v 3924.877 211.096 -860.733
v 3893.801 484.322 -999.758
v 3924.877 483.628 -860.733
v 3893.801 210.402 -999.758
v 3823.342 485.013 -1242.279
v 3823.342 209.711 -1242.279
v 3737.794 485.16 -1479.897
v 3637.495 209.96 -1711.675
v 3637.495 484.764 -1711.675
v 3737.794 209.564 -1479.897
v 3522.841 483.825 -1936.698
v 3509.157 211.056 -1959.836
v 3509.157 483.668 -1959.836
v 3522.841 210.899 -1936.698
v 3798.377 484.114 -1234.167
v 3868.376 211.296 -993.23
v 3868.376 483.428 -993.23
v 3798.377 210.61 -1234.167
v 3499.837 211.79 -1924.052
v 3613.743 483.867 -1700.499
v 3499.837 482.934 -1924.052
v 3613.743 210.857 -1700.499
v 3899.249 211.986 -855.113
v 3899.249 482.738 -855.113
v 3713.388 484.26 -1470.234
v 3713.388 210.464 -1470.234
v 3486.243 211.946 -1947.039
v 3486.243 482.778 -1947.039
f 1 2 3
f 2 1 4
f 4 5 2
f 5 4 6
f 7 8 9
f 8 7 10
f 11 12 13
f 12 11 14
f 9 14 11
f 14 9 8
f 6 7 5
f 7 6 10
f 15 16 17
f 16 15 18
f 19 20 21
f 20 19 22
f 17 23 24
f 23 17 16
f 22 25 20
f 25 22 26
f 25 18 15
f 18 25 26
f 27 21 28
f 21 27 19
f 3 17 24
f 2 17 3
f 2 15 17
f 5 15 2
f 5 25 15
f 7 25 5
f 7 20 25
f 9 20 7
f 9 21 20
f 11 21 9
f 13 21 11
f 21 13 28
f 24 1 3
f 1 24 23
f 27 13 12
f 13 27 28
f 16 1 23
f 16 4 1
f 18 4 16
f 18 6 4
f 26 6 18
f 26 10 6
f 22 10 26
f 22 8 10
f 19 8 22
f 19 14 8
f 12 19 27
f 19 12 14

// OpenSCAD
rotate(-90.0, [1.0, 0.0, 0.0]) {
    translate([0.0, 0.0, 347.362]) {
    intersection() {
    difference() {
    cylinder(h = 315.0, r = 4020.1, $fn=100, center=true);
    cylinder(h = 615.0, r = 3993.85, $fn=100, center=true);
}
    rotate(20.776137298, [0.0, 0.0, 1.0]) {
    rotate(-90.0, [0.0, 1.0, 0.0]) {
    polyhedron(
    points=[ [165.375,712.955,-4824.12], [165.375,-712.955,-4824.12],
             [-165.375,-712.955,-4824.12], [-165.375,712.955,-4824.12], [0,0,0] ],
    faces=[ [0,1,4], [1,2,4], [2,3,4], [3,0,4], [1,0,3], [2,1,3] ]
);
}
}
}
}
}
